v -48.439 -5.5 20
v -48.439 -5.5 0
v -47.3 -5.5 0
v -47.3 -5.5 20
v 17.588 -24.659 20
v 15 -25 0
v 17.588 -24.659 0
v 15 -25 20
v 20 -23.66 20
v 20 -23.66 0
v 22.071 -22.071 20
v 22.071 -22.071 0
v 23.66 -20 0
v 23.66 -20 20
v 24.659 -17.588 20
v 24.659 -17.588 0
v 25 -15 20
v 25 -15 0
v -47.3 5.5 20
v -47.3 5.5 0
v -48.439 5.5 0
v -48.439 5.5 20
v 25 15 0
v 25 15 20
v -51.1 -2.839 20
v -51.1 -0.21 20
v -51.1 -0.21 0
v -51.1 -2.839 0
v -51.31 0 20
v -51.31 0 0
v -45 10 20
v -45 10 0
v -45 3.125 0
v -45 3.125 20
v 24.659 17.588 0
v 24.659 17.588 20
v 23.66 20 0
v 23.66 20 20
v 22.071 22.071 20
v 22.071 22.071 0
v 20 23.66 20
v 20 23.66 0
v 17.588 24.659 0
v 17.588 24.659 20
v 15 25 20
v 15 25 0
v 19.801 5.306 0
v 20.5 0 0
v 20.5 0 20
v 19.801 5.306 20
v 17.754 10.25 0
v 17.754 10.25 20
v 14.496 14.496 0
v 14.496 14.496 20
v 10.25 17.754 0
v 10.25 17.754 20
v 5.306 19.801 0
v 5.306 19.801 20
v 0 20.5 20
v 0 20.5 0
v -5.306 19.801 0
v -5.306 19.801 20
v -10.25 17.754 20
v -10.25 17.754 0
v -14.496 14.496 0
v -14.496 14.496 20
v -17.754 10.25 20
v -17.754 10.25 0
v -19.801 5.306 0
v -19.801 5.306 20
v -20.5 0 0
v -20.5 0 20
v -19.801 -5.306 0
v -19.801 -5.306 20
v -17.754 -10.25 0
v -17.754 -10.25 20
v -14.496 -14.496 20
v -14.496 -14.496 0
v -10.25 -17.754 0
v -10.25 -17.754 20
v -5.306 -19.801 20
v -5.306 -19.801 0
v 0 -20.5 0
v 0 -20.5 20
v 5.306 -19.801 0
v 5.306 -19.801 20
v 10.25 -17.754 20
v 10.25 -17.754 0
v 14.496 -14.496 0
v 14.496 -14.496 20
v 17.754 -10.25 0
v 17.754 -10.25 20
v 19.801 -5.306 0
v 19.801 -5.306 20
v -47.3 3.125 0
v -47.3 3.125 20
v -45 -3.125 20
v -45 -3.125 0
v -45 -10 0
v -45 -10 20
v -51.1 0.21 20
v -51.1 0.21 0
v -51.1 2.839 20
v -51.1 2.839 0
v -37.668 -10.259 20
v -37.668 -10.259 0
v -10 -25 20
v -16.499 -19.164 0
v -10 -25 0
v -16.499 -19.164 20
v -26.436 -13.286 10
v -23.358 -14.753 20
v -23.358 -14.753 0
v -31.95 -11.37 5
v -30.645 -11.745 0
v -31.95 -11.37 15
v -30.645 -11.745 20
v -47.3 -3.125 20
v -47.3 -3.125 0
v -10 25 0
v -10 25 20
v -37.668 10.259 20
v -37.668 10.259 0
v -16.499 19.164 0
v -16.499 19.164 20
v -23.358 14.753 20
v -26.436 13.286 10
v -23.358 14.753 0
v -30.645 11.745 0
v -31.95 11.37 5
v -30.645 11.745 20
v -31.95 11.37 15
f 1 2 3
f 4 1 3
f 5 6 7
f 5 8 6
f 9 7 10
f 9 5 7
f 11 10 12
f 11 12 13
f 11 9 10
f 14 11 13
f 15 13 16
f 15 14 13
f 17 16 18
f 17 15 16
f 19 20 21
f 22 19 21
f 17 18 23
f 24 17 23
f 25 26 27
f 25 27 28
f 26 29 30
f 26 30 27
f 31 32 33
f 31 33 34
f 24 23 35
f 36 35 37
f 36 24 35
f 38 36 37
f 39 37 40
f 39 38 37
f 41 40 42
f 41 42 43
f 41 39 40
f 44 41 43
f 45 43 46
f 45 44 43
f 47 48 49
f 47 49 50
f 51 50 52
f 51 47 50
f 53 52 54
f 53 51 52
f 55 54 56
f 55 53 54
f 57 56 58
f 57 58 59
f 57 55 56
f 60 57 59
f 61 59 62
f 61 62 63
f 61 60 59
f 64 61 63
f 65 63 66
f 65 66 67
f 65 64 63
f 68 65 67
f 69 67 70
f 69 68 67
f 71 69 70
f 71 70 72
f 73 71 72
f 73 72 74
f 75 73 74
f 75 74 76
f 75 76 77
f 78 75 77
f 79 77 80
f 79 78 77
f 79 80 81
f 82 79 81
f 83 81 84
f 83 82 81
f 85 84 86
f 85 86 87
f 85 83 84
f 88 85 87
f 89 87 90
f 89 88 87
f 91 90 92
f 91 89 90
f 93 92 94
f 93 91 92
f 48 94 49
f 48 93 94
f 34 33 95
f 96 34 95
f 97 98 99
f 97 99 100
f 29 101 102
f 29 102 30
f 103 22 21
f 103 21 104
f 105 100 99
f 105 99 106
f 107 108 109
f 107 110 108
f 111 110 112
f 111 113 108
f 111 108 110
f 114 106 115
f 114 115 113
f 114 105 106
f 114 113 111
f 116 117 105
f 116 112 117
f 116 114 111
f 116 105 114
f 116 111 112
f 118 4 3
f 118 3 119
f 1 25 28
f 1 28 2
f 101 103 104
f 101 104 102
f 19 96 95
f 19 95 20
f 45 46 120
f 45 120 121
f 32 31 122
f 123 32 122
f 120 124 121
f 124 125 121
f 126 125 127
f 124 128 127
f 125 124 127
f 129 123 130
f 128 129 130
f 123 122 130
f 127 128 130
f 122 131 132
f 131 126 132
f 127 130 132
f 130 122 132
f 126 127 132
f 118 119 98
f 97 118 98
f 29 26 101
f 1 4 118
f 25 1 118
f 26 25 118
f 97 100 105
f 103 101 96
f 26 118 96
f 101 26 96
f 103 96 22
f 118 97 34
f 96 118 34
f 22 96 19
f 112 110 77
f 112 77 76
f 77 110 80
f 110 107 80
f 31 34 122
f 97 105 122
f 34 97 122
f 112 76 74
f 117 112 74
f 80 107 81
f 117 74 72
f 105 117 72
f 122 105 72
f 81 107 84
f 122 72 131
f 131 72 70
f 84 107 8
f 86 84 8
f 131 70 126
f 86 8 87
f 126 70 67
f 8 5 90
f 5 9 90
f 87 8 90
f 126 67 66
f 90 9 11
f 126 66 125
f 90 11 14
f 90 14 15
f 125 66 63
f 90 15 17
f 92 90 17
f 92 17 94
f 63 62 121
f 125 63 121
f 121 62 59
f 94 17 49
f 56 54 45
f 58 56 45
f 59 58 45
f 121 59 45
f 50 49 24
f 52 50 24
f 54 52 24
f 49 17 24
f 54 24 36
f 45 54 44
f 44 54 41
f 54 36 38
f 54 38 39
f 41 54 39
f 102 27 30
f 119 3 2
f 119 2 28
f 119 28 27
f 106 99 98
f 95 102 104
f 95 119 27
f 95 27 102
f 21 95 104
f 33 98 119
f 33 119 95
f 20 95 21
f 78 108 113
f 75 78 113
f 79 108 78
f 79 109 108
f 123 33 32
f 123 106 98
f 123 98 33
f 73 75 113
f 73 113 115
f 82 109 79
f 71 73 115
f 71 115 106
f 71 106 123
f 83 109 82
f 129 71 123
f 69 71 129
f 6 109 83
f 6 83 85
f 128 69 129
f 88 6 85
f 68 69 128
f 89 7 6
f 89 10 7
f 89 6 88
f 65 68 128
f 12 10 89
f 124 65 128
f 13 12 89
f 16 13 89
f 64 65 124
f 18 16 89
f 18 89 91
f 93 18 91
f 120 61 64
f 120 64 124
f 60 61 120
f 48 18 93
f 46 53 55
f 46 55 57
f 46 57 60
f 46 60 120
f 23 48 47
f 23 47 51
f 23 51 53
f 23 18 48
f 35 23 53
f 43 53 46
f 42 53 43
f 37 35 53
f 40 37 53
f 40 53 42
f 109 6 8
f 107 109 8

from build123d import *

# Parameters (mm, degrees)
SKETCH1_W           = 50
SKETCH1_H           = 50
SKETCH1_R           = 20.5
BOSS_EXTRUDE1_DEPTH = 20
SKETCH2_W           = 20
SKETCH2_H           = 50
BOSS_EXTRUDE2_DEPTH = 20
CUT_EXTRUDE1_DEPTH  = 20
BOSS_EXTRUDE3_DEPTH = 20
FILLET1_R           = 10


with BuildPart() as part:
    # Sketch1 → Boss-Extrude1 (new body)
    with BuildSketch(Plane.XY):
        Rectangle(SKETCH1_W, SKETCH1_H)
        Circle(SKETCH1_R, mode=Mode.SUBTRACT)
    extrude(amount=BOSS_EXTRUDE1_DEPTH)

    # Sketch2 → Boss-Extrude2 (add)
    with BuildSketch(Plane.ZY.offset(25)):
        with Locations((10, 0)):
            Rectangle(SKETCH2_W, SKETCH2_H)
    extrude(amount=BOSS_EXTRUDE2_DEPTH)

    # Sketch3 → Cut-Extrude1 (cut)
    with BuildSketch(Plane.XY.offset(20)):
        with BuildLine():
            Line((-45, 25), (-45, 10))
            add(Edge.make_bspline(
                [(-45, 10), (-25.372837907, 9.072160547), (-10, 25)],
                knots=[0, 0, 0, 1, 1, 1], degree=2))
            Line((-10, 25), (-45, 25))
        make_face()
        with BuildLine():
            add(Edge.make_bspline(
                [(-45, -10), (-25.372837907, -9.072160547), (-10, -25)],
                knots=[0, 0, 0, 1, 1, 1], degree=2))
            Line((-45, -10), (-45, -25))
            Line((-45, -25), (-10, -25))
        make_face()
    extrude(amount=-CUT_EXTRUDE1_DEPTH, mode=Mode.SUBTRACT)

    # Sketch4 → Boss-Extrude3 (add)
    with BuildSketch(Plane.XY.offset(20)):
        Polygon((-46.455, -3.125), (-45, -3.125), (-45, 3.125), (-46.455, 3.125), (-46.8, 3.125), (-47.3, 3.125), (-47.3, 5.5), (-48.439339828, 5.5), (-51.1, 2.839339828), (-51.1, 0.21), (-51.31, 0), (-51.1, -0.21), (-51.1, -2.839339828), (-48.439339828, -5.5), (-47.3, -5.5), (-47.3, -3.125), (-46.8, -3.125), align=None)
    extrude(amount=-BOSS_EXTRUDE3_DEPTH)

    # Fillet1
    fillet1_edges = [part.edges().sort_by_distance(p)[0] for p in [
        (25, -25, 10),
        (25, 25, 10),
    ]]
    fillet(fillet1_edges, radius=FILLET1_R)


solid = part.part
